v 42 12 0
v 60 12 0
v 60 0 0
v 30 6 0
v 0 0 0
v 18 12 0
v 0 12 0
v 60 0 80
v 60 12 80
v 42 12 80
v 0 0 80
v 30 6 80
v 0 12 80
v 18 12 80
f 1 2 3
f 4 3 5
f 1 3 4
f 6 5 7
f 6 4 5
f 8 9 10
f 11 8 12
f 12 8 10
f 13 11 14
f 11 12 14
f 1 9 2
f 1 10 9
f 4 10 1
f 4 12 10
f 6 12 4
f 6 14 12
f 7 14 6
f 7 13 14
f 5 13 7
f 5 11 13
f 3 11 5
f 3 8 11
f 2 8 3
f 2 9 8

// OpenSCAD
$fn = 32;

// ----------------------------------------------------------------------
// V guide rail: vway, 60 mm wide
// ----------------------------------------------------------------------

// --- parameters (mm) ---
rail_w = 60;              // rail width, X
base_t = 12;              // base plate thickness
v_depth = 6;              // V feature depth / height
v_half_w = 12;            // half width of the V at the base face
plate_t = 80;             // rail length, Z (the extrusion height)
fit_tol = 0.05;           // declared fit tolerance (prompt contract)
free_tol = 0.2;           // declared free tolerance (prompt contract)

profile = [[0, 0], [60, 0], [60, 12], [42, 12], [30, 6], [18, 12], [0, 12]];  // primary outline, 7 points, counter clockwise

// --- the one profile operation ---
linear_extrude(height = plate_t) polygon(points = profile);
